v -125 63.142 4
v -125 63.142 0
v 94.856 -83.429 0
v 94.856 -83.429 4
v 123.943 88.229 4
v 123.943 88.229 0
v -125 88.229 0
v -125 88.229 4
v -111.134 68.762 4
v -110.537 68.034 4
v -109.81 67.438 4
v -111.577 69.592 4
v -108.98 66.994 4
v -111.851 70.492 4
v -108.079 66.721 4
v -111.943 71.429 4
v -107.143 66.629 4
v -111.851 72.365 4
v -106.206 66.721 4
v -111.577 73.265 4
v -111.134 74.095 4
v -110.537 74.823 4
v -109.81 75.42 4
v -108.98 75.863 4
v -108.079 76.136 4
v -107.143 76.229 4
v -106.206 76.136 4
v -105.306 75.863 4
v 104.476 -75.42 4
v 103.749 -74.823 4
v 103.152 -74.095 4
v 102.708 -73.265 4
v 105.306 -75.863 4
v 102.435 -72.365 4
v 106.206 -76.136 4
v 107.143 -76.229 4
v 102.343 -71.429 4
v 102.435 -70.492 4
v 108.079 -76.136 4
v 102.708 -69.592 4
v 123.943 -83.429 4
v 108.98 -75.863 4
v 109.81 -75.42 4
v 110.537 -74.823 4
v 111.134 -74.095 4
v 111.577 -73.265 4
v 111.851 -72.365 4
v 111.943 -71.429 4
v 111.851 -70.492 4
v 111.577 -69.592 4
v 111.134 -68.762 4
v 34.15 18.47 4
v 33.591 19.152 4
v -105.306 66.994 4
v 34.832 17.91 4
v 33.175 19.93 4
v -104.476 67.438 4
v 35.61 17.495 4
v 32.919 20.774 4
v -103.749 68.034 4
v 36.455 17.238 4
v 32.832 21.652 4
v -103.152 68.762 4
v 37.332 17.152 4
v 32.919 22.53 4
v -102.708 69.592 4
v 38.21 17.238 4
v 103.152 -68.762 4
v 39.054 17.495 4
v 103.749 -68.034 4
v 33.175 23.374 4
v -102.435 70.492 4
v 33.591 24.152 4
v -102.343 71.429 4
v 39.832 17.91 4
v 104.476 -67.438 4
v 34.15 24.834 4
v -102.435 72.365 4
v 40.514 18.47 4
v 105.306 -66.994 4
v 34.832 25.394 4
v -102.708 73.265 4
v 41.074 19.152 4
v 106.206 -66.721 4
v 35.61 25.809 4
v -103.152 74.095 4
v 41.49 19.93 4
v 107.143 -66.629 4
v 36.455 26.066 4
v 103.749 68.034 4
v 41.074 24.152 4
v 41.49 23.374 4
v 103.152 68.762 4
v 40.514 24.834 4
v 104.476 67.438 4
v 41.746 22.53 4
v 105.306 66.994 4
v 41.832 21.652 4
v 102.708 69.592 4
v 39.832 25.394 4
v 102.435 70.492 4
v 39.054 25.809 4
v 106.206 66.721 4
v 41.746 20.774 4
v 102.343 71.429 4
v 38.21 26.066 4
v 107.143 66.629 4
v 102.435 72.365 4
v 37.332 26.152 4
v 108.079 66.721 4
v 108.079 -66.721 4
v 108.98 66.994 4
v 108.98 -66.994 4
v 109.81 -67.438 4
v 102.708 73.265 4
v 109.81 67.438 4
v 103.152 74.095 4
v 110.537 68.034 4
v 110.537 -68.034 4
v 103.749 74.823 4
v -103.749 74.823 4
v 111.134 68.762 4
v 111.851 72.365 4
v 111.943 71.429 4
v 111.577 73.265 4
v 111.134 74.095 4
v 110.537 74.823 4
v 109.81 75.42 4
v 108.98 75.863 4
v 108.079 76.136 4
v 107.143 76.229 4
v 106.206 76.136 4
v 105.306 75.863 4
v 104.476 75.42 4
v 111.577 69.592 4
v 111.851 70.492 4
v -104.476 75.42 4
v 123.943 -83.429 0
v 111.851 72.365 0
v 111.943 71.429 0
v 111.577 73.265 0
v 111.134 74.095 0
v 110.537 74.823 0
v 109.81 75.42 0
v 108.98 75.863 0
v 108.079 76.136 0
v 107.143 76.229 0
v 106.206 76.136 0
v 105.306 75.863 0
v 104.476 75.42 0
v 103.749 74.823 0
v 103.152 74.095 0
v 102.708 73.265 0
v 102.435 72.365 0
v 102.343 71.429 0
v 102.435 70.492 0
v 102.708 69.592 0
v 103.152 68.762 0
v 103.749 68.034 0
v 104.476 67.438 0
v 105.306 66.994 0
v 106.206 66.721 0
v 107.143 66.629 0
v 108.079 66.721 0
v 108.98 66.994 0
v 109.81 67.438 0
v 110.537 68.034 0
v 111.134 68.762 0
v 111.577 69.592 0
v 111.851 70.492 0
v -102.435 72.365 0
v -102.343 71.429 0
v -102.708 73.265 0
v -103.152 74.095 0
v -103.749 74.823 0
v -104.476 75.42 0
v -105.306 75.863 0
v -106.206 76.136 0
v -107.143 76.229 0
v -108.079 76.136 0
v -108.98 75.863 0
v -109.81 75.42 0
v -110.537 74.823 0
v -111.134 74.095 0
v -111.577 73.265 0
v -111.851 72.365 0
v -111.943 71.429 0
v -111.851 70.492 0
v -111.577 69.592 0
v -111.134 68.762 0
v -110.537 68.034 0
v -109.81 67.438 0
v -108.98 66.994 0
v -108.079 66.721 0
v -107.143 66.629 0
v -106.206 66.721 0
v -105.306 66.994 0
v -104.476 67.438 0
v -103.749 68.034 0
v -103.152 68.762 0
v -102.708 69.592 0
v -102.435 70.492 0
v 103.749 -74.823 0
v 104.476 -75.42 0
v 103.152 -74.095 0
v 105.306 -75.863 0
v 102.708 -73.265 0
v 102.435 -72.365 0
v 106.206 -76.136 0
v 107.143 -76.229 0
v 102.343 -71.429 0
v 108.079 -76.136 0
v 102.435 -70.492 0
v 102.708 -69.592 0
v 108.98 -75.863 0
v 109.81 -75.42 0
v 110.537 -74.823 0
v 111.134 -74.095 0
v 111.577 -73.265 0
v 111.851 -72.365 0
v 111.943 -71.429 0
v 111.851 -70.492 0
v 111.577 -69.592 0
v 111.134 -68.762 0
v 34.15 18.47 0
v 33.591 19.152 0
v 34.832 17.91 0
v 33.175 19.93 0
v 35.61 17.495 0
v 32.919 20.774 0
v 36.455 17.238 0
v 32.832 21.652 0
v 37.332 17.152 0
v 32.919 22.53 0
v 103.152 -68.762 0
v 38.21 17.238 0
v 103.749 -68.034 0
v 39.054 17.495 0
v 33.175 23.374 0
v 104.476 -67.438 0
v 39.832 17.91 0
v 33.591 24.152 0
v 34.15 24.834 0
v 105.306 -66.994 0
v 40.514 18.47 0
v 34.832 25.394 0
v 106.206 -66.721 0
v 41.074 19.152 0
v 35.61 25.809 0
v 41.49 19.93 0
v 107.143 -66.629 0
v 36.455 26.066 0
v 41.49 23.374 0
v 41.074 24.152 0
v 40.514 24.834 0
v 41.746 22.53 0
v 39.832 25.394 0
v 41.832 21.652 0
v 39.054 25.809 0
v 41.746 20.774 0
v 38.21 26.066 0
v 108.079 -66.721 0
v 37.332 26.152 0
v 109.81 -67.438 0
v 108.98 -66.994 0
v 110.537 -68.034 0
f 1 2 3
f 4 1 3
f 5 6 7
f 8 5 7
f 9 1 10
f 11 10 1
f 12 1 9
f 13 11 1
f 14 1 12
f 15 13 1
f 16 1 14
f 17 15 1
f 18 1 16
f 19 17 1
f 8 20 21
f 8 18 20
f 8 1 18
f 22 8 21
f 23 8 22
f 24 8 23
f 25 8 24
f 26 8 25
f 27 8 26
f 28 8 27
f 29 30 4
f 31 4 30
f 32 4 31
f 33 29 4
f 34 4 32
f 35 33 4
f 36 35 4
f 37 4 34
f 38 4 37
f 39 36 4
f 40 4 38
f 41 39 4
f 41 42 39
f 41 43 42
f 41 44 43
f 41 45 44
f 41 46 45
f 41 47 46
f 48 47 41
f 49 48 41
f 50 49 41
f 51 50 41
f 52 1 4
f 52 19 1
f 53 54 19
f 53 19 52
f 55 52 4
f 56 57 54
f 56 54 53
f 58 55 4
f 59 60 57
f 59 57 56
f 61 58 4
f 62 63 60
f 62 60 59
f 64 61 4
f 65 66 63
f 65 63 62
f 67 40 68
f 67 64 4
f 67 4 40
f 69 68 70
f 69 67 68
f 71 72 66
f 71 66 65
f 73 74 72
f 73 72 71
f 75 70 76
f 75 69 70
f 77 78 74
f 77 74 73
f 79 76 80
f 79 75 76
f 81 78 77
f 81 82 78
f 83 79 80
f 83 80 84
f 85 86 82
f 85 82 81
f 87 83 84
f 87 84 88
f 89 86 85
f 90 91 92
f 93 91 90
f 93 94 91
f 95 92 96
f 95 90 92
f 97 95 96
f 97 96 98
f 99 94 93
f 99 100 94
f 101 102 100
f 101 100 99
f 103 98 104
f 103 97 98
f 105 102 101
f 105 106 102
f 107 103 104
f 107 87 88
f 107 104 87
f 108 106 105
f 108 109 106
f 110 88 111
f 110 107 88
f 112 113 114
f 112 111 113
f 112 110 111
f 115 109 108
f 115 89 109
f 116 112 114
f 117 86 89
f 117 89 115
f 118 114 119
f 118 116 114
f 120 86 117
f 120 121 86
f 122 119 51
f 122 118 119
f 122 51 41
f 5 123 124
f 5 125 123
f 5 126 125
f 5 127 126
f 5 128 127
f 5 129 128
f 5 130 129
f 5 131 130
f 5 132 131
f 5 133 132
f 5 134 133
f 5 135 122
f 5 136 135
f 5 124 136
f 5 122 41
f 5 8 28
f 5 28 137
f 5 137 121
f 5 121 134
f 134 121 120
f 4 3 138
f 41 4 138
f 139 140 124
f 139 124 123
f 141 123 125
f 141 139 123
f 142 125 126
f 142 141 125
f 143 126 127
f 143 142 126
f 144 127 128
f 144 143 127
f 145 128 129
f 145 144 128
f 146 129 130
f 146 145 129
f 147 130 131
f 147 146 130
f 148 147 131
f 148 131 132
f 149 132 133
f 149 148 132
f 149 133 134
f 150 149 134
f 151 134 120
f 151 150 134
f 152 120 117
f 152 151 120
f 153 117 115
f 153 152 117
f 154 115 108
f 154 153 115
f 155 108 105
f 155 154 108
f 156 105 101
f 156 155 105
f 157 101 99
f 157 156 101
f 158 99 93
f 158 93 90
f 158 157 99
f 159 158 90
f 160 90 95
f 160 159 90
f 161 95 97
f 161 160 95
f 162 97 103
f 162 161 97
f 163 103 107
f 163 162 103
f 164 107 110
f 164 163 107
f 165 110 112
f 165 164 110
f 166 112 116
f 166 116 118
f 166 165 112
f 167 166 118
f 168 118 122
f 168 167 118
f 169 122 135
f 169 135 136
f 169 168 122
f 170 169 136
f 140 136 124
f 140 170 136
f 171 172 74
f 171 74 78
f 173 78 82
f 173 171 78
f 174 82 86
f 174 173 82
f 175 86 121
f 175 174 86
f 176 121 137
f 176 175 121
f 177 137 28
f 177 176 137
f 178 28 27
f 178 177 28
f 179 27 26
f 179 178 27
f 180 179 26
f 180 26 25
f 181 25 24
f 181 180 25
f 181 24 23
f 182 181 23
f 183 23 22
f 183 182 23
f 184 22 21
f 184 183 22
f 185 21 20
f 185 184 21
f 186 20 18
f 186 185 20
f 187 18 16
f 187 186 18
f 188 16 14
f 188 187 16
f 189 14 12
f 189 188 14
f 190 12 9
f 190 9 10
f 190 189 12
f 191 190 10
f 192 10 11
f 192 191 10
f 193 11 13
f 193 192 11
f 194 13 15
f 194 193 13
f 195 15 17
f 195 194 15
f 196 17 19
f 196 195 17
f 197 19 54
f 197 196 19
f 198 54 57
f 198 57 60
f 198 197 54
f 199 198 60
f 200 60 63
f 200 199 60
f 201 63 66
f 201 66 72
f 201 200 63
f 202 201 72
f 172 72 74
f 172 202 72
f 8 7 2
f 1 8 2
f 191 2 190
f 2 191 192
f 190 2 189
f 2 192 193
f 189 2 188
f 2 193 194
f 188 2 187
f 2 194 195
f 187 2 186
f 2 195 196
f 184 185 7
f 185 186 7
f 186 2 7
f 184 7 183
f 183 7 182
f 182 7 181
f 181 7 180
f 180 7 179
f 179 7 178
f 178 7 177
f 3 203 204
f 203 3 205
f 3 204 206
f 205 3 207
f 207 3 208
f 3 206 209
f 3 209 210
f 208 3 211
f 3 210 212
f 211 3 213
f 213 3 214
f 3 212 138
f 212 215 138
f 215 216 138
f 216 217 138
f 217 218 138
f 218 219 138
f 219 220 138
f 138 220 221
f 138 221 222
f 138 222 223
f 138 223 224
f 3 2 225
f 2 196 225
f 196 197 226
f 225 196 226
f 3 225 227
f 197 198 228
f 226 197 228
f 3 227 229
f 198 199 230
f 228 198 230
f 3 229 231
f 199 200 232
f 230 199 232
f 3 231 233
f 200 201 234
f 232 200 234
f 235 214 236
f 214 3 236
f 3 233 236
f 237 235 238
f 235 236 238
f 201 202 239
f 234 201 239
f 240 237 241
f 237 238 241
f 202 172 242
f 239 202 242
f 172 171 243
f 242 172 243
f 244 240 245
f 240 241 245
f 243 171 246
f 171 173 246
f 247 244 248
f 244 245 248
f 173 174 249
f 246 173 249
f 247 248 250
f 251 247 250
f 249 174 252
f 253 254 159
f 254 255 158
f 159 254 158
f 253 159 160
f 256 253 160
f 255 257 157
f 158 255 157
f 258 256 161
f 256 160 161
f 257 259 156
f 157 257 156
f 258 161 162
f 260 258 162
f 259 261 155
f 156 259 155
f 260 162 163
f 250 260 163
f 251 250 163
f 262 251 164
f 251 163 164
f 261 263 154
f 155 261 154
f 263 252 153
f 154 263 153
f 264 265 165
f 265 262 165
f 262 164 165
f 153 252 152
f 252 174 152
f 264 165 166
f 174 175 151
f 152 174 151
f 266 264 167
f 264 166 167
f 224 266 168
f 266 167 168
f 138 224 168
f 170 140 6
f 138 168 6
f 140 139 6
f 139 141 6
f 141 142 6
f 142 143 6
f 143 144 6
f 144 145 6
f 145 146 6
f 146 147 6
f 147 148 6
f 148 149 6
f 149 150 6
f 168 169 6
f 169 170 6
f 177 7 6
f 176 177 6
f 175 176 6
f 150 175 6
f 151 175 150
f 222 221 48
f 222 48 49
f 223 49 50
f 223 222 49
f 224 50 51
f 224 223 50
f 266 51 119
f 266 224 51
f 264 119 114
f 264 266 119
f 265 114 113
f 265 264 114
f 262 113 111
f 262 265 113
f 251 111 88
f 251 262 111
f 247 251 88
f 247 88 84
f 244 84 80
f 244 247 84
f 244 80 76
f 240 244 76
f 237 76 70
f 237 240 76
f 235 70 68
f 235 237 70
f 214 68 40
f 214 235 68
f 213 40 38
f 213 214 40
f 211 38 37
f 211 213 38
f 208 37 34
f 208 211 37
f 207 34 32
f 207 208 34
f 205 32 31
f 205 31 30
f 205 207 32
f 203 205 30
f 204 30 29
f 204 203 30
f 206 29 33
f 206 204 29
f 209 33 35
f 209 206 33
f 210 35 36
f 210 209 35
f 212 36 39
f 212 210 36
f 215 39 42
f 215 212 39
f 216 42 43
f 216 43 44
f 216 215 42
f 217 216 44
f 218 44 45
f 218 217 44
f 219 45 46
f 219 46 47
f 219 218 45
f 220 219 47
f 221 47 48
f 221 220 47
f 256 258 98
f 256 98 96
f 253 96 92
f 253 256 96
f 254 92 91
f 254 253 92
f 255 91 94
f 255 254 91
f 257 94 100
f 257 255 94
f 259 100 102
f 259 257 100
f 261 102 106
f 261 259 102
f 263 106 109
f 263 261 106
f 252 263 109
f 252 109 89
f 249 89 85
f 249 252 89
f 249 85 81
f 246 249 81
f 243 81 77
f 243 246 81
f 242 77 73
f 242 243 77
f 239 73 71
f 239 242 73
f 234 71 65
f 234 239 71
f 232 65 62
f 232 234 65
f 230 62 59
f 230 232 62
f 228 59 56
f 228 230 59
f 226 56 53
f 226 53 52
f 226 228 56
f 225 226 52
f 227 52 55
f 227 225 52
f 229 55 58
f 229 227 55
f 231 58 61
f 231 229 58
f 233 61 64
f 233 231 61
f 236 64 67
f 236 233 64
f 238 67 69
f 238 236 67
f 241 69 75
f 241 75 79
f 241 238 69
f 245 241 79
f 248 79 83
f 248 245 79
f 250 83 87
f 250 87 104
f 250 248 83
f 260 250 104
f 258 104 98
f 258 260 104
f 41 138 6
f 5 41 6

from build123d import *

# Parameters (mm, degrees)
SKETCH1_R           = 4.8
SKETCH1_R_2         = 1.5
SKETCH1_R_3         = 4.5
BOSS_EXTRUDE1_DEPTH = 4


with BuildPart() as part:
    # Sketch1 → Boss-Extrude1 (new body)
    # profile 1 of 5: a face of its own
    with BuildSketch(Plane.XY):
        Polygon((-125, 88.228571429), (-125, 63.142246191), (94.856226429, -83.428571429), (123.942857143, -83.428571429), (123.942857143, 88.228571429), align=None)
        with Locations((107.142857143, -71.428571429)):
            Circle(SKETCH1_R, mode=Mode.SUBTRACT)
        with Locations((-107.142857143, 71.428571429)):
            Circle(SKETCH1_R, mode=Mode.SUBTRACT)
        with Locations((21.832408692, 6.152026506)):
            Circle(SKETCH1_R_2, mode=Mode.SUBTRACT)
        with Locations((37.332408692, 21.652026506)):
            Circle(SKETCH1_R_3, mode=Mode.SUBTRACT)
        with Locations((52.832408692, 6.152026506)):
            Circle(SKETCH1_R_2, mode=Mode.SUBTRACT)
        with Locations((21.832408692, 37.152026506)):
            Circle(SKETCH1_R_2, mode=Mode.SUBTRACT)
        with Locations((52.832408692, 37.152026506)):
            Circle(SKETCH1_R_2, mode=Mode.SUBTRACT)
        with Locations((107.142857143, 71.428571429)):
            Circle(SKETCH1_R, mode=Mode.SUBTRACT)
    # profile 2 of 5: a face of its own
    with BuildSketch(Plane.XY):
        with Locations((21.832408692, 6.152026506)):
            Circle(SKETCH1_R_2)
    # profile 3 of 5: a face of its own
    with BuildSketch(Plane.XY):
        with Locations((21.832408692, 37.152026506)):
            Circle(SKETCH1_R_2)
    # profile 4 of 5: a face of its own
    with BuildSketch(Plane.XY):
        with Locations((52.832408692, 37.152026506)):
            Circle(SKETCH1_R_2)
    # profile 5 of 5: a face of its own
    with BuildSketch(Plane.XY):
        with Locations((52.832408692, 6.152026506)):
            Circle(SKETCH1_R_2)
    extrude(amount=BOSS_EXTRUDE1_DEPTH)


solid = part.part
